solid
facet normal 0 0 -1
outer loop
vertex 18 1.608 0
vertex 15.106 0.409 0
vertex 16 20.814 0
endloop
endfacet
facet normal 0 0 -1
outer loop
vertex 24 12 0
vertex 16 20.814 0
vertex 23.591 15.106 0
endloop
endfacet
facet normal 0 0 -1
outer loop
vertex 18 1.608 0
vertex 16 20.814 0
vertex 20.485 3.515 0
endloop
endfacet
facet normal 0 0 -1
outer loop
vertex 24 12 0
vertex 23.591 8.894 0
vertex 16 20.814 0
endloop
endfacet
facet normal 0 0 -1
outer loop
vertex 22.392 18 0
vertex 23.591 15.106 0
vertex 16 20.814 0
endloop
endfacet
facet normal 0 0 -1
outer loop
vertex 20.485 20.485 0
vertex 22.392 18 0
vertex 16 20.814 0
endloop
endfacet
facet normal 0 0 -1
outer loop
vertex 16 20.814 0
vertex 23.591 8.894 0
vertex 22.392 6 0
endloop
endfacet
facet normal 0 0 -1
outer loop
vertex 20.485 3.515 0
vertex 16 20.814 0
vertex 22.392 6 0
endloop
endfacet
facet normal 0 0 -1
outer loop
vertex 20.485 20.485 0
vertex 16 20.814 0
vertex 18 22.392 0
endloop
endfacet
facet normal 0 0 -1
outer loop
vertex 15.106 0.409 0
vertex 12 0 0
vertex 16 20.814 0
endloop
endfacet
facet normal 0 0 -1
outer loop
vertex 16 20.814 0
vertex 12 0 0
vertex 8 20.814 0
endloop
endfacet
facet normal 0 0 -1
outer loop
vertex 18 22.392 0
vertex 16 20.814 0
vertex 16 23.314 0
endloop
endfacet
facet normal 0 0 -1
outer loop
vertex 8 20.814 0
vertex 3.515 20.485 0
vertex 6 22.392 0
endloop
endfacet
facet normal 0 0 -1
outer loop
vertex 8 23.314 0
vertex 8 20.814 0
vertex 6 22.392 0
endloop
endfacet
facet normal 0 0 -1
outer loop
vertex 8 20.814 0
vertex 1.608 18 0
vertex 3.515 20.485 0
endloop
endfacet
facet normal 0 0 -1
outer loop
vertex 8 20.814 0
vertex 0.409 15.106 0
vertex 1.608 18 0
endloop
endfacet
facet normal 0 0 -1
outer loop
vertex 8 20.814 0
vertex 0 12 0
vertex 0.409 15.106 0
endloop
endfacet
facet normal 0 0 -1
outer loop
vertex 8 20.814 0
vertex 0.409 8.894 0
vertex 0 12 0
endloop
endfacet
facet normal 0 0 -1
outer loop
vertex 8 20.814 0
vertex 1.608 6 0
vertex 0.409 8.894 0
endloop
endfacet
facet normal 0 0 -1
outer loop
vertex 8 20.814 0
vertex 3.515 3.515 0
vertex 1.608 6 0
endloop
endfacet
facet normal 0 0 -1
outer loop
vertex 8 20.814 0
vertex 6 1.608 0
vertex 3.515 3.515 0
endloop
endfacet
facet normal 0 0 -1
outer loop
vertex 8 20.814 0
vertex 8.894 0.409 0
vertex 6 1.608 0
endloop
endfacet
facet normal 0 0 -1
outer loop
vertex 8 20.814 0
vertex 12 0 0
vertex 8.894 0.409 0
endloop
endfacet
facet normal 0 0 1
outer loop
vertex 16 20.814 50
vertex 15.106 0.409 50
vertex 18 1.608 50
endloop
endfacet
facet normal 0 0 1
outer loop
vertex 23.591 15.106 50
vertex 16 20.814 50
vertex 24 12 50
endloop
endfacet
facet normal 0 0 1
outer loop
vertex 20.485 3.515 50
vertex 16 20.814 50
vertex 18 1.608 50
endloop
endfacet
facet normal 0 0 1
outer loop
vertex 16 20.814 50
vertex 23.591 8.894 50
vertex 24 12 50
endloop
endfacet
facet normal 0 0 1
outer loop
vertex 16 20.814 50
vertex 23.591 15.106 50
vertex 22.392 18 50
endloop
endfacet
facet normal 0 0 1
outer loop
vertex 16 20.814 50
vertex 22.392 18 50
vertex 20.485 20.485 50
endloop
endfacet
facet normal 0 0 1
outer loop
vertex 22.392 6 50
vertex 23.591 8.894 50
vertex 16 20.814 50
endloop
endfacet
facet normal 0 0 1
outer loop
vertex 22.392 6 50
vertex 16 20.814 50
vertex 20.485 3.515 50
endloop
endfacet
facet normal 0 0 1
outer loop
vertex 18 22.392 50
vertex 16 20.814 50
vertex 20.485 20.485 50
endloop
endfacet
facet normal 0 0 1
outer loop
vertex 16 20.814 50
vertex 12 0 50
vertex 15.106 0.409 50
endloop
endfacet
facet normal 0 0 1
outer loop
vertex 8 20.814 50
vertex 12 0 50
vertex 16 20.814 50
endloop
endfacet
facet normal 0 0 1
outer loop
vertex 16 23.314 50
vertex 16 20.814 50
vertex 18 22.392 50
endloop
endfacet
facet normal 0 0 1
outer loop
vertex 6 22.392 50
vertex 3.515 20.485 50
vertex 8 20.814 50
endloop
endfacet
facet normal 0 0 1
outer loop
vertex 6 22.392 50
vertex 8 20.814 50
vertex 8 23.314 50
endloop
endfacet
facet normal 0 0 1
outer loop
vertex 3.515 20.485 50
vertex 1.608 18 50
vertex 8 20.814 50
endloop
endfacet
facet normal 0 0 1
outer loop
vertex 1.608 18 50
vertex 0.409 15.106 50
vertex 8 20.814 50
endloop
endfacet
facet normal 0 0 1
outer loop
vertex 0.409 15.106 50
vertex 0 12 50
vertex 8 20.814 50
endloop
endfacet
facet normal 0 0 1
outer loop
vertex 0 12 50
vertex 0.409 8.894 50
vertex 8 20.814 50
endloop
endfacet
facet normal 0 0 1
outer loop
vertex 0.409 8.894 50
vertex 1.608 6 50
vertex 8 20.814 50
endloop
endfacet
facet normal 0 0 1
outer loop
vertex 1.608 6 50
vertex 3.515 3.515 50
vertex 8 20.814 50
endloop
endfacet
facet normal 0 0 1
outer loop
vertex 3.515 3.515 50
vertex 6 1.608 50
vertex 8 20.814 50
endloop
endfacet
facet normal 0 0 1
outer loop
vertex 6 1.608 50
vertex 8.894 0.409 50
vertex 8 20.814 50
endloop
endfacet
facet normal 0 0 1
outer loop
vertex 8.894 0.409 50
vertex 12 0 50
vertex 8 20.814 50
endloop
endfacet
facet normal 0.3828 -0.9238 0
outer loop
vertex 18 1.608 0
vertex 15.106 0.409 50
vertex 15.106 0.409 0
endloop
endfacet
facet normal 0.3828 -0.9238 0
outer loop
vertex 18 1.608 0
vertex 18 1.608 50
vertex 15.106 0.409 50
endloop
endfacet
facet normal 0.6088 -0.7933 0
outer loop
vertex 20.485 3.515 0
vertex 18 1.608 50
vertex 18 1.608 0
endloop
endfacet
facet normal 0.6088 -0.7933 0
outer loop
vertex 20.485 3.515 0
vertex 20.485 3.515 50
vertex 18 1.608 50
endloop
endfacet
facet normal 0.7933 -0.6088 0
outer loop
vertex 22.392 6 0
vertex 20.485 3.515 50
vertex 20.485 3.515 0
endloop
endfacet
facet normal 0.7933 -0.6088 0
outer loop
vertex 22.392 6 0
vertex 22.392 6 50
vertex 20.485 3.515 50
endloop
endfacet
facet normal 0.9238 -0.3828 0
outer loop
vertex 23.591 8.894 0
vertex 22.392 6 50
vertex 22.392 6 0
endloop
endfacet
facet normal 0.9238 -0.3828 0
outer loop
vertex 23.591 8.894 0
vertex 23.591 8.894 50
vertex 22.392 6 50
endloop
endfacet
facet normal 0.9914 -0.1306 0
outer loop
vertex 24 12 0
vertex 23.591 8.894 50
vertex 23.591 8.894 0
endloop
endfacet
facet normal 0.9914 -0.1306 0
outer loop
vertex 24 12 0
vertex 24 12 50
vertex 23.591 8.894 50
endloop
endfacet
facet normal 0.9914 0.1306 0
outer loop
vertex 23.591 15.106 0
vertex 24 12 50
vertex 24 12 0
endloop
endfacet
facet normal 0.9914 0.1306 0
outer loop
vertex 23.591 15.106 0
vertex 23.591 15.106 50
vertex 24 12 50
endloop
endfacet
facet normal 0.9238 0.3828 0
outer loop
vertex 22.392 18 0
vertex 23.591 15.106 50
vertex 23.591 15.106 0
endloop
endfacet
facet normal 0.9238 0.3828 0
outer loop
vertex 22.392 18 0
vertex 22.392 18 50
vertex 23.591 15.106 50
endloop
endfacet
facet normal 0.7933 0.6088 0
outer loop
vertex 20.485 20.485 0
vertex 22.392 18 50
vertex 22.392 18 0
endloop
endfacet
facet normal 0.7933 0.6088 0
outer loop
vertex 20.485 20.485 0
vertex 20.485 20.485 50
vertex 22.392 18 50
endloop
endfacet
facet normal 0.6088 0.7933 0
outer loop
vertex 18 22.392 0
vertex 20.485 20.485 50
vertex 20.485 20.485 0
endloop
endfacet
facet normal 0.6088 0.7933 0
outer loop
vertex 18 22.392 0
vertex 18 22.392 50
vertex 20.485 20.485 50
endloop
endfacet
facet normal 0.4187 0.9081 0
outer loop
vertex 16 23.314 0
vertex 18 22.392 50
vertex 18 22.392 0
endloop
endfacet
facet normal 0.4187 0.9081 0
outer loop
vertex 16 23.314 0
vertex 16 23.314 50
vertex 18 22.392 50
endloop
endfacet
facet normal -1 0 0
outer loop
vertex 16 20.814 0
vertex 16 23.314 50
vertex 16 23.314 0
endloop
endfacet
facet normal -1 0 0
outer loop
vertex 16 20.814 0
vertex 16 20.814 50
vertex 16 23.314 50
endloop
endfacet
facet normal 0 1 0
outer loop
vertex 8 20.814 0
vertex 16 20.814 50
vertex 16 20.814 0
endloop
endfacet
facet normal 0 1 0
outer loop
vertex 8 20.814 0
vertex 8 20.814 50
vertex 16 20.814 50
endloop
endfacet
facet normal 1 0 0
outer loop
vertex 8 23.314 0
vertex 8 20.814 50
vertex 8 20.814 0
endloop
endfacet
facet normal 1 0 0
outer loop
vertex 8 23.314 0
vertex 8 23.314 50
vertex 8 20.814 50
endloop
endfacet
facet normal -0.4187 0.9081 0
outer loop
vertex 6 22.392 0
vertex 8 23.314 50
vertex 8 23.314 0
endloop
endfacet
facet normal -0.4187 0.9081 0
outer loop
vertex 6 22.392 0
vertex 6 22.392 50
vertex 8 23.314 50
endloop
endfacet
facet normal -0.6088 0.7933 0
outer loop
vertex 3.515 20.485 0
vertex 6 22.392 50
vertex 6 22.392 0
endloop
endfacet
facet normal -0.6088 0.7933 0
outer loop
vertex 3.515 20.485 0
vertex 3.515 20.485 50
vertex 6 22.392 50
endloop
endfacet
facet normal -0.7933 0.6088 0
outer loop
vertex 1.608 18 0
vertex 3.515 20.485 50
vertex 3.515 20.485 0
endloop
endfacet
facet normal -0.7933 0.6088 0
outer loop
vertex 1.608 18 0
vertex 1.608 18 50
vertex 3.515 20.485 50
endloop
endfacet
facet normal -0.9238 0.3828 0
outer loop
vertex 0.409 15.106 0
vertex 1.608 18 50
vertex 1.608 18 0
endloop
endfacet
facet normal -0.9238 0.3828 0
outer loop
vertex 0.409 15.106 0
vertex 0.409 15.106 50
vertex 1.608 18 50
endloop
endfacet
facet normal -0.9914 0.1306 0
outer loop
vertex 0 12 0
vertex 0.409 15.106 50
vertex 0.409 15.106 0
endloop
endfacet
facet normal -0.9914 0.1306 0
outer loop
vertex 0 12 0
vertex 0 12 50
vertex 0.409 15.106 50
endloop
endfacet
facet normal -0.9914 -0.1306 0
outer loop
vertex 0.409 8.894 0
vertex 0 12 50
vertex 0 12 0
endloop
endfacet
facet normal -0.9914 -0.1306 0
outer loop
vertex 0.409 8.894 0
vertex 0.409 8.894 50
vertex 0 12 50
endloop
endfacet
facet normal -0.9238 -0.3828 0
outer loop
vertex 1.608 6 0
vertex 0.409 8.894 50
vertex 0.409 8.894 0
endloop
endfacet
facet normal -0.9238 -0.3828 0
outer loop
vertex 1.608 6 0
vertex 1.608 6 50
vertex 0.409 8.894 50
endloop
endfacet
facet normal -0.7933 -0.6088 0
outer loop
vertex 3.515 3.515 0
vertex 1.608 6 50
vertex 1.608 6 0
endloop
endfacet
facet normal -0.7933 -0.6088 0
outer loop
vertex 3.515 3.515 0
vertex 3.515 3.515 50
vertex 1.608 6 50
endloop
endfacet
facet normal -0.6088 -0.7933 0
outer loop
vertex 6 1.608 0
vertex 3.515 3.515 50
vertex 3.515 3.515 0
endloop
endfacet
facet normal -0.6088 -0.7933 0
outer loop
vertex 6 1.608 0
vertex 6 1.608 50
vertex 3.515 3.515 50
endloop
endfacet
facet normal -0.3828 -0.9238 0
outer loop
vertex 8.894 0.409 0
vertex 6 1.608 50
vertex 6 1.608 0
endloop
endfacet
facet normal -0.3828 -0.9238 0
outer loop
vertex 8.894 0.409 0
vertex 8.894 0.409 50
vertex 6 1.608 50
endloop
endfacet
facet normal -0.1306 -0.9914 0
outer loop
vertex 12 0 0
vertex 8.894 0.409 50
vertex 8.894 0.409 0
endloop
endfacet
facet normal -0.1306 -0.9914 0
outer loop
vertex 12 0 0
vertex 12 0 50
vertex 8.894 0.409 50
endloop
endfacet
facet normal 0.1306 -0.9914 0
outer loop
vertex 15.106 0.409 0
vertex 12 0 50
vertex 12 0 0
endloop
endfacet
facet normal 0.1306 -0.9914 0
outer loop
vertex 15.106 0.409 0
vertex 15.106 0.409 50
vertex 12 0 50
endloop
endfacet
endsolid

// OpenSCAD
$fn = 32;

// ----------------------------------------------------------------------
// Keyway shaft: d24 shaft, key 8 x 2.5 mm
// ----------------------------------------------------------------------

// --- parameters (mm) ---
shaft_r = 12;             // shaft radius
key_w = 8;                // keyway width
key_d = 2.5;              // keyway depth below the surface line
plate_t = 50;             // shaft length, Z (extrusion height)

shaft_d = 2 * shaft_r;  // shaft diameter
circle_step = 15;  // polygon sampling step, degrees

profile = [[6, 22.392], [3.515, 20.485], [1.608, 18], [0.409, 15.106], [0, 12], [0.409, 8.894], [1.608, 6], [3.515, 3.515], [6, 1.608], [8.894, 0.409], [12, 0], [15.106, 0.409], [18, 1.608], [20.485, 3.515], [22.392, 6], [23.591, 8.894], [24, 12], [23.591, 15.106], [22.392, 18], [20.485, 20.485], [18, 22.392], [16, 23.314], [16, 20.814], [8, 20.814], [8, 23.314]];  // primary outline, 25 points, counter clockwise

// --- the one profile operation ---
linear_extrude(height = plate_t) polygon(points = profile);
